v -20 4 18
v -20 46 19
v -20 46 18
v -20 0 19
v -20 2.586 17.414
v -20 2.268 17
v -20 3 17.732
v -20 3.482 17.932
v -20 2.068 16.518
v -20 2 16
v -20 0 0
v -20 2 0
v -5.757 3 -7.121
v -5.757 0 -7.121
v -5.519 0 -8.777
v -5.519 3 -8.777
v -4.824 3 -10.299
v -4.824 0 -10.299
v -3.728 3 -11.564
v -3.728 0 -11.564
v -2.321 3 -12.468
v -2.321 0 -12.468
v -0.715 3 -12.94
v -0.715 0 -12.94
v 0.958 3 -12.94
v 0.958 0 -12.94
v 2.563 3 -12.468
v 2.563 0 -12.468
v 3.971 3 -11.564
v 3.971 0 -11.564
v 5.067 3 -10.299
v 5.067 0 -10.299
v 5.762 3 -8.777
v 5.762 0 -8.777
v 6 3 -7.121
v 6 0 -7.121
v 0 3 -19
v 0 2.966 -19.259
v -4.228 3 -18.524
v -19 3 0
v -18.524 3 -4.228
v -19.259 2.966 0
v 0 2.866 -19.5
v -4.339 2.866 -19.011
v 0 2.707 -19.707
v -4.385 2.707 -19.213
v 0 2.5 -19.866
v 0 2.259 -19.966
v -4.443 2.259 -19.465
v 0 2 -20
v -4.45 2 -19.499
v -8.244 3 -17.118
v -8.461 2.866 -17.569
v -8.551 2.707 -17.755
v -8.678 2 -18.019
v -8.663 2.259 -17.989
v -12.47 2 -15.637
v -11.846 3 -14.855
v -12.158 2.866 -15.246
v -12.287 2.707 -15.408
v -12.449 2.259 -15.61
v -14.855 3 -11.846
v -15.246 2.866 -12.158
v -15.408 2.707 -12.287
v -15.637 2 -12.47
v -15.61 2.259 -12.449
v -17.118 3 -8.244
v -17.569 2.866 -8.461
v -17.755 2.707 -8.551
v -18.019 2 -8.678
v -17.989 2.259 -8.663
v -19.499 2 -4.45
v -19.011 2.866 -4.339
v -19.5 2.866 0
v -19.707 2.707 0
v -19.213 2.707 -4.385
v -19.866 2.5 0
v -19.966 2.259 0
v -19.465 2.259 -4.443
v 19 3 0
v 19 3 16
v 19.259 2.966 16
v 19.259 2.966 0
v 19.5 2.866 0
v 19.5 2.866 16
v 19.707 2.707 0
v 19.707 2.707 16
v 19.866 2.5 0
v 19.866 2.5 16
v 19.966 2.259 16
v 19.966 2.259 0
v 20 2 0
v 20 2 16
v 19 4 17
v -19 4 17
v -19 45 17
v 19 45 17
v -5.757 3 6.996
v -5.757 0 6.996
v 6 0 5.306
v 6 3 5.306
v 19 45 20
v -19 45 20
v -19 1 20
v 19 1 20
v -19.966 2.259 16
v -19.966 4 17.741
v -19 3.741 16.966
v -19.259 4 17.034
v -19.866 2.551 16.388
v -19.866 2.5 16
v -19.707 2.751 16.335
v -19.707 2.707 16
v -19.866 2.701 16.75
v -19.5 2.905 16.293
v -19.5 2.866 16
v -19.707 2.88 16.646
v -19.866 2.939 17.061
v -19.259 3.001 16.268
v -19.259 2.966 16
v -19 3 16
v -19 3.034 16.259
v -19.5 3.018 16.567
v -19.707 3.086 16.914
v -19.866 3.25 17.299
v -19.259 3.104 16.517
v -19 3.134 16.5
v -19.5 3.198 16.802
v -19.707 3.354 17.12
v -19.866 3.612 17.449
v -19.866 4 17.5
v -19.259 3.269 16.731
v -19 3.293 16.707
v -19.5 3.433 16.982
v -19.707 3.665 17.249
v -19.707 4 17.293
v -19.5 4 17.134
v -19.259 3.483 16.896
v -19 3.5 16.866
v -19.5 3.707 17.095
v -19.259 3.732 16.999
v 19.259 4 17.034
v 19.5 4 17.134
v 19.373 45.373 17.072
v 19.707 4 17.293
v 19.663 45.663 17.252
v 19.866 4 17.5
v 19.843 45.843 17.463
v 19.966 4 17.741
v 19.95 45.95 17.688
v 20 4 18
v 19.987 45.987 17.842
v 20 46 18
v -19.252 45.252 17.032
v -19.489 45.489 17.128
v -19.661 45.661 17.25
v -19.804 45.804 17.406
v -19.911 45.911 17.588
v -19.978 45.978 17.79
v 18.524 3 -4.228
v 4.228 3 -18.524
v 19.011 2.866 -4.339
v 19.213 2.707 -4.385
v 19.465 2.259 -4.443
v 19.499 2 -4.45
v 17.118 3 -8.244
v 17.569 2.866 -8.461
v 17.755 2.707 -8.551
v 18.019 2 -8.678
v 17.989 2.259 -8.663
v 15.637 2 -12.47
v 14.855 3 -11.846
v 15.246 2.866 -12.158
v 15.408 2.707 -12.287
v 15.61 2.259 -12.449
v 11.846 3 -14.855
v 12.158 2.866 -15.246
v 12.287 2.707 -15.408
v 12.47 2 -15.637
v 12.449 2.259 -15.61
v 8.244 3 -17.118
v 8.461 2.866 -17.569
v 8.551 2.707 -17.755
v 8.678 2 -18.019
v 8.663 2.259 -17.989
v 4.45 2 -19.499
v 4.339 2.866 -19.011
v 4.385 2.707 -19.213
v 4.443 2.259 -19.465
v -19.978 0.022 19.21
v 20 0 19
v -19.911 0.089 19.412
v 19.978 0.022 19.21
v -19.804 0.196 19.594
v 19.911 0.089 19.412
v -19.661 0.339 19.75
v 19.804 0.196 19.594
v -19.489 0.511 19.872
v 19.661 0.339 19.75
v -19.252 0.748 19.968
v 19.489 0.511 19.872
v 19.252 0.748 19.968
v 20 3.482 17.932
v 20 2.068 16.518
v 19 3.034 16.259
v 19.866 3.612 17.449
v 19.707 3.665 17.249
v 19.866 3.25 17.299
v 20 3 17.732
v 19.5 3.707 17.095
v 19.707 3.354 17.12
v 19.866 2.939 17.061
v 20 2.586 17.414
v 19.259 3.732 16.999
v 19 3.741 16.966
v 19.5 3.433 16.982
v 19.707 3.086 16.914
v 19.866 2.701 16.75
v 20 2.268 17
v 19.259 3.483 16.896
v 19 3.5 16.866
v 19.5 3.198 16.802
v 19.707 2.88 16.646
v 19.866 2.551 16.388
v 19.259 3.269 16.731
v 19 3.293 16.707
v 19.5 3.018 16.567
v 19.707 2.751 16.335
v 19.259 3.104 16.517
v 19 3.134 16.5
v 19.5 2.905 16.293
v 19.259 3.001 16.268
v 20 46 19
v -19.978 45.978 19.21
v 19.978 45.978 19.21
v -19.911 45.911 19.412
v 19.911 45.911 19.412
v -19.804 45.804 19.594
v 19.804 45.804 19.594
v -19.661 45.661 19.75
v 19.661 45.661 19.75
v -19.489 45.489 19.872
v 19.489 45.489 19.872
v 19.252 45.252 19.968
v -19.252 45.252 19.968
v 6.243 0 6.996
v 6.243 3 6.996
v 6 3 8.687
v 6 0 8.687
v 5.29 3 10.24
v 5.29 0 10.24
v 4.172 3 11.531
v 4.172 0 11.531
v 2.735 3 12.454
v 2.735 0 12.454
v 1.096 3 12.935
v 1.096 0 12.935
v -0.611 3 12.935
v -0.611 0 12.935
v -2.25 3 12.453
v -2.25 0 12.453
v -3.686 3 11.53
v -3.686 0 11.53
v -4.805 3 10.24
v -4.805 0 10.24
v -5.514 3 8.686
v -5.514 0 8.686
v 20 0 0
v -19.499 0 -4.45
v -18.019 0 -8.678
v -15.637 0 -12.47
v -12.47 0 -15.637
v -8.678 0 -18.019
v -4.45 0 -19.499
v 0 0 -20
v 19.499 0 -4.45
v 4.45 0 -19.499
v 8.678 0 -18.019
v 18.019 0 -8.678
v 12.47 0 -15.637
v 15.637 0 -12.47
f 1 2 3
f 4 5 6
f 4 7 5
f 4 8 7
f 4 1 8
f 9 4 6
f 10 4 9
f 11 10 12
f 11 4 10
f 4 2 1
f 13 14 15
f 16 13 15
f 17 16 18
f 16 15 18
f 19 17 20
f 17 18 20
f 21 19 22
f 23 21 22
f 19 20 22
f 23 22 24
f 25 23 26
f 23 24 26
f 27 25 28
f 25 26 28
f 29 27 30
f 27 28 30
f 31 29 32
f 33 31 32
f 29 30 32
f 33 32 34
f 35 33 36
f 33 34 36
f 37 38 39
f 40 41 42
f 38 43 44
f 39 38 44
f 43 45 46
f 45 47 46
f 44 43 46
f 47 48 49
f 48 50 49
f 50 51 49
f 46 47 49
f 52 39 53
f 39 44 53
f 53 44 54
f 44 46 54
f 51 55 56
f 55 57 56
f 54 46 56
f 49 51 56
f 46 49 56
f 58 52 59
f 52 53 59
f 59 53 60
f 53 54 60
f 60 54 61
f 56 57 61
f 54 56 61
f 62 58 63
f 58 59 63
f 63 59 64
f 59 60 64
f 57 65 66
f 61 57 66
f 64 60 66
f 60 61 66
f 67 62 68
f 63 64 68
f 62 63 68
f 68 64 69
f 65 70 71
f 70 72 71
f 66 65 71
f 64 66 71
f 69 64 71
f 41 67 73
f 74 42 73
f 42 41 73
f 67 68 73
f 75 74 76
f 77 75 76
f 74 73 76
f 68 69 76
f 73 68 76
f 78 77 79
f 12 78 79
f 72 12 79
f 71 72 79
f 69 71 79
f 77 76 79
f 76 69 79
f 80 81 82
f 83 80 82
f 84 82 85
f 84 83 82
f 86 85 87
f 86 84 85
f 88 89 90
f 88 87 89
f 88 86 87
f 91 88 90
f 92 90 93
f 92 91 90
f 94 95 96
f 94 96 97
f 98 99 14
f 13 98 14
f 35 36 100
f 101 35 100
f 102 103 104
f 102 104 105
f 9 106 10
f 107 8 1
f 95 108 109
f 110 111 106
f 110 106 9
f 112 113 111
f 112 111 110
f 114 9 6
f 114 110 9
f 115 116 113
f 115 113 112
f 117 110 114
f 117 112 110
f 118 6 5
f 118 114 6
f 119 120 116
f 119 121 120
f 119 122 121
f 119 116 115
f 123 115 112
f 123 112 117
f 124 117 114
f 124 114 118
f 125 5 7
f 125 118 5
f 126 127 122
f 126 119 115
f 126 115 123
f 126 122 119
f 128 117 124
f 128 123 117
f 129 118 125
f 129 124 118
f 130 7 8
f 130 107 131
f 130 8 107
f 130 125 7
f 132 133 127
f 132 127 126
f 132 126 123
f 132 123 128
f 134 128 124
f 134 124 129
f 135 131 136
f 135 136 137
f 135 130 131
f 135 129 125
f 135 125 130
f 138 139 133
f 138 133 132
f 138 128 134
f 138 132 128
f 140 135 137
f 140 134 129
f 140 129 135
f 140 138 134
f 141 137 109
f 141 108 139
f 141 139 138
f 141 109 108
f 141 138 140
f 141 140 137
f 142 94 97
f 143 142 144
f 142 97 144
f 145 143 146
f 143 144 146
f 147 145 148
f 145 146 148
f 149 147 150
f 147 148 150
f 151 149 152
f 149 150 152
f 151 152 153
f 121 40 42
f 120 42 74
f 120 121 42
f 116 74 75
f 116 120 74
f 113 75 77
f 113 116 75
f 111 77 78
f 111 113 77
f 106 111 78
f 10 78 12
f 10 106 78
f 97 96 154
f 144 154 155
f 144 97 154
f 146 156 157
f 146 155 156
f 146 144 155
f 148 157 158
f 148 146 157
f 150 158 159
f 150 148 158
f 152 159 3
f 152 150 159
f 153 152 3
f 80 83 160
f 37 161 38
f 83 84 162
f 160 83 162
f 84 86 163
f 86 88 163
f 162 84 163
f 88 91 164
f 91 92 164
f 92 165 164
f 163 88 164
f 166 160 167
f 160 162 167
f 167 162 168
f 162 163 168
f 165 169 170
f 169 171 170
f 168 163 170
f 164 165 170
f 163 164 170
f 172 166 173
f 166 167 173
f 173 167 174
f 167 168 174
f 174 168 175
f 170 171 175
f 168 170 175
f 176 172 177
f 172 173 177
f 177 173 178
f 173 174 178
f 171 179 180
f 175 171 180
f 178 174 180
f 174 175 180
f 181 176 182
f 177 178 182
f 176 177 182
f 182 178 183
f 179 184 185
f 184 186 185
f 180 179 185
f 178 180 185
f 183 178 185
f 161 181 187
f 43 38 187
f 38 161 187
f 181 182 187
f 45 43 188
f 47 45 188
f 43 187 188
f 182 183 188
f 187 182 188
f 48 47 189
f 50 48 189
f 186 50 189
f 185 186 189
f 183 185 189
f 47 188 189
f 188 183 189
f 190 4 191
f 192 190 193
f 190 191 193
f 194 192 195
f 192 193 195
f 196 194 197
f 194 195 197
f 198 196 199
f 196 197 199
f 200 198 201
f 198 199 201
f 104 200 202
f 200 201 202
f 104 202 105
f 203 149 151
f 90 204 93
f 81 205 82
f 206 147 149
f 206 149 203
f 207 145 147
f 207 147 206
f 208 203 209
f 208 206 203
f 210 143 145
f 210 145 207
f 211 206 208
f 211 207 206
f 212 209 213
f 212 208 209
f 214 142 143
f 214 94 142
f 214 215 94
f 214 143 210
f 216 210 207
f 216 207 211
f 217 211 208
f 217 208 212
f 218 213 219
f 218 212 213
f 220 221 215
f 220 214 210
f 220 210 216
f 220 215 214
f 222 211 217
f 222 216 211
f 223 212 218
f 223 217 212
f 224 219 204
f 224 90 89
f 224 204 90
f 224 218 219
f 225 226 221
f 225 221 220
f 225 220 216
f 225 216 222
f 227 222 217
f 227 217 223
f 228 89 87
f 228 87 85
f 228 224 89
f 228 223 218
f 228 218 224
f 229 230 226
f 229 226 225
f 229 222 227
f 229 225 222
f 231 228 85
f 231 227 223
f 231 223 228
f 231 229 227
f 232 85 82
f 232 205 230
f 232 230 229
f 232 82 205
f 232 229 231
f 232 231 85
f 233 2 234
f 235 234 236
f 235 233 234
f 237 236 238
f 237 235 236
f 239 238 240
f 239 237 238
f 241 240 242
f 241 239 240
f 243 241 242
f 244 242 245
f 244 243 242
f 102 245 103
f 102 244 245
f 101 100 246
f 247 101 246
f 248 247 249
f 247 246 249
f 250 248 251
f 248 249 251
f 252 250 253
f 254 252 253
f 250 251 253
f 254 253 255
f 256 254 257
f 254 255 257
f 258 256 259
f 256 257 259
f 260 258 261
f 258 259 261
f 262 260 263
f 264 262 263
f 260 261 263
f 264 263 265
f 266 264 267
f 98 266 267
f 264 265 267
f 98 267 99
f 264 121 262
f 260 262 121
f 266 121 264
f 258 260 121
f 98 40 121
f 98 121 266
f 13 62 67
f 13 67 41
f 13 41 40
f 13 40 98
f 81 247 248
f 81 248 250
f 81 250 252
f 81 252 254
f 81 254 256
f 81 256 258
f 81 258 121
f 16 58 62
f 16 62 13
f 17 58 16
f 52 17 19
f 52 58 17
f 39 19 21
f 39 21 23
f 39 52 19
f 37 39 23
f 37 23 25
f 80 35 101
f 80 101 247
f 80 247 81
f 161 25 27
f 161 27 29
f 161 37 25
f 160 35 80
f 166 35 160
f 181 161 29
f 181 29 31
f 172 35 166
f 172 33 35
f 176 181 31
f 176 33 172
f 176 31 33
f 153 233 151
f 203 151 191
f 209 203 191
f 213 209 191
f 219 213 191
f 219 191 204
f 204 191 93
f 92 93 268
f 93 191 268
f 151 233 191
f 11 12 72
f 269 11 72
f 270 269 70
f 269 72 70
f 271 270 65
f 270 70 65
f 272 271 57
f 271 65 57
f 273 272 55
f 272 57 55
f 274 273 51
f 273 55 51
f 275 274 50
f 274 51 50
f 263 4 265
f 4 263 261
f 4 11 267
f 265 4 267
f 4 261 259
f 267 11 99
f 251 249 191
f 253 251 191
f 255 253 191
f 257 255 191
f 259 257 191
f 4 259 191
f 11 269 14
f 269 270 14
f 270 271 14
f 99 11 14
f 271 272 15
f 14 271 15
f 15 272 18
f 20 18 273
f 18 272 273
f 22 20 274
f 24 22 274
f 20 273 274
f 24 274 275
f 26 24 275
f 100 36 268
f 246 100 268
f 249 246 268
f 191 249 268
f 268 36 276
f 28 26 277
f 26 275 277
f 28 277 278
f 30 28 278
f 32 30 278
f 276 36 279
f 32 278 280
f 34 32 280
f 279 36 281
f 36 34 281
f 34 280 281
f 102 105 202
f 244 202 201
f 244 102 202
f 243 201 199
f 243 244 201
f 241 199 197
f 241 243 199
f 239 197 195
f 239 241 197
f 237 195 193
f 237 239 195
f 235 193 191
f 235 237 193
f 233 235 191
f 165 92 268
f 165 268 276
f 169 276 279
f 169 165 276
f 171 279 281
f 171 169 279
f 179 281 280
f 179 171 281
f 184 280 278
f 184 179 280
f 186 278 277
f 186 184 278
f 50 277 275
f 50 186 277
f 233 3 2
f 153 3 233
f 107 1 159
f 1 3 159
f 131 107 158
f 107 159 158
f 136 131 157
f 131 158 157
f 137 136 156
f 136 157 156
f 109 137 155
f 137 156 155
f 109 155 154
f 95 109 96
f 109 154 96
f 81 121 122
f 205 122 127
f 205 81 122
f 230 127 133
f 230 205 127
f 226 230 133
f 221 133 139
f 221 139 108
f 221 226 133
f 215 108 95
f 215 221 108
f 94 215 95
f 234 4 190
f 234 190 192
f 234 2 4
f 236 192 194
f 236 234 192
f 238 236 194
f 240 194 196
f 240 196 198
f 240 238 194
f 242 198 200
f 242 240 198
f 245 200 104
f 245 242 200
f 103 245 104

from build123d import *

# Parameters (mm, degrees)
SKETCH2_W           = 40
SKETCH2_H           = 40
BOSS_EXTRUDE1_DEPTH = 3
SKETCH4_W           = 40
SKETCH4_H           = 3
BOSS_EXTRUDE2_DEPTH = 43
FILLET3_R           = 20
CUT_EXTRUDE1_DEPTH  = 37
FILLET4_R           = 1


with BuildPart() as part:
    # Sketch2 → Boss-Extrude1 (new body)
    with BuildSketch(Plane(origin=(0, 0, 0), x_dir=(1, 0, 0), z_dir=(0, 1, 0))):
        Rectangle(SKETCH2_W, SKETCH2_H)
    extrude(amount=BOSS_EXTRUDE1_DEPTH)

    # Sketch4 → Boss-Extrude2 (add)
    with BuildSketch(Plane(origin=(0, 3, 0), x_dir=(1, 0, 0), z_dir=(0, 1, 0))):
        with Locations((0, -18.5)):
            Rectangle(SKETCH4_W, SKETCH4_H)
    extrude(amount=BOSS_EXTRUDE2_DEPTH)

    # Fillet3
    fillet3_edges = [part.edges().sort_by_distance(p)[0] for p in [
        (20, 1.5, -20),
        (-20, 1.5, -20),
    ]]
    fillet(fillet3_edges, radius=FILLET3_R - 0.0001)  # a hair under: the kernel refuses the full size

    # Sketch5 → Cut-Extrude1 (cut)
    with BuildSketch(Plane.XZ):
        with BuildLine():
            Line((6, -7.120873555), (6, 5.305936672))
            ThreePointArc((6, 5.305936672), (1.096488494, 12.934754262), (-5.757118415, 6.995785055))
            Line((-5.757118415, 6.995785055), (-5.757118415, -7.120873555))
            ThreePointArc((-5.757118415, -7.120873555), (0.121440793, -12.999432762), (6, -7.120873555))
        make_face()
    extrude(amount=-CUT_EXTRUDE1_DEPTH, mode=Mode.SUBTRACT)

    # Fillet4
    fillet4_edges = [part.edges().sort_by_distance(p)[0] for p in [
        (20, 3, 8.49995),
        (-20, 24.5, 17),
        (0, 3, 17),
        (20, 24.5, 17),
        (0, 46, 20),
        (0, 46, 17),
        (-20, 3, 8.49995),
        (-14.142164913, 3, -14.142164913),
        (14.142164913, 3, -14.142164913),
        (0, 0, 20),
        (20, 23, 20),
        (-20, 23, 20),
    ]]
    fillet(fillet4_edges, radius=FILLET4_R)


solid = part.part
